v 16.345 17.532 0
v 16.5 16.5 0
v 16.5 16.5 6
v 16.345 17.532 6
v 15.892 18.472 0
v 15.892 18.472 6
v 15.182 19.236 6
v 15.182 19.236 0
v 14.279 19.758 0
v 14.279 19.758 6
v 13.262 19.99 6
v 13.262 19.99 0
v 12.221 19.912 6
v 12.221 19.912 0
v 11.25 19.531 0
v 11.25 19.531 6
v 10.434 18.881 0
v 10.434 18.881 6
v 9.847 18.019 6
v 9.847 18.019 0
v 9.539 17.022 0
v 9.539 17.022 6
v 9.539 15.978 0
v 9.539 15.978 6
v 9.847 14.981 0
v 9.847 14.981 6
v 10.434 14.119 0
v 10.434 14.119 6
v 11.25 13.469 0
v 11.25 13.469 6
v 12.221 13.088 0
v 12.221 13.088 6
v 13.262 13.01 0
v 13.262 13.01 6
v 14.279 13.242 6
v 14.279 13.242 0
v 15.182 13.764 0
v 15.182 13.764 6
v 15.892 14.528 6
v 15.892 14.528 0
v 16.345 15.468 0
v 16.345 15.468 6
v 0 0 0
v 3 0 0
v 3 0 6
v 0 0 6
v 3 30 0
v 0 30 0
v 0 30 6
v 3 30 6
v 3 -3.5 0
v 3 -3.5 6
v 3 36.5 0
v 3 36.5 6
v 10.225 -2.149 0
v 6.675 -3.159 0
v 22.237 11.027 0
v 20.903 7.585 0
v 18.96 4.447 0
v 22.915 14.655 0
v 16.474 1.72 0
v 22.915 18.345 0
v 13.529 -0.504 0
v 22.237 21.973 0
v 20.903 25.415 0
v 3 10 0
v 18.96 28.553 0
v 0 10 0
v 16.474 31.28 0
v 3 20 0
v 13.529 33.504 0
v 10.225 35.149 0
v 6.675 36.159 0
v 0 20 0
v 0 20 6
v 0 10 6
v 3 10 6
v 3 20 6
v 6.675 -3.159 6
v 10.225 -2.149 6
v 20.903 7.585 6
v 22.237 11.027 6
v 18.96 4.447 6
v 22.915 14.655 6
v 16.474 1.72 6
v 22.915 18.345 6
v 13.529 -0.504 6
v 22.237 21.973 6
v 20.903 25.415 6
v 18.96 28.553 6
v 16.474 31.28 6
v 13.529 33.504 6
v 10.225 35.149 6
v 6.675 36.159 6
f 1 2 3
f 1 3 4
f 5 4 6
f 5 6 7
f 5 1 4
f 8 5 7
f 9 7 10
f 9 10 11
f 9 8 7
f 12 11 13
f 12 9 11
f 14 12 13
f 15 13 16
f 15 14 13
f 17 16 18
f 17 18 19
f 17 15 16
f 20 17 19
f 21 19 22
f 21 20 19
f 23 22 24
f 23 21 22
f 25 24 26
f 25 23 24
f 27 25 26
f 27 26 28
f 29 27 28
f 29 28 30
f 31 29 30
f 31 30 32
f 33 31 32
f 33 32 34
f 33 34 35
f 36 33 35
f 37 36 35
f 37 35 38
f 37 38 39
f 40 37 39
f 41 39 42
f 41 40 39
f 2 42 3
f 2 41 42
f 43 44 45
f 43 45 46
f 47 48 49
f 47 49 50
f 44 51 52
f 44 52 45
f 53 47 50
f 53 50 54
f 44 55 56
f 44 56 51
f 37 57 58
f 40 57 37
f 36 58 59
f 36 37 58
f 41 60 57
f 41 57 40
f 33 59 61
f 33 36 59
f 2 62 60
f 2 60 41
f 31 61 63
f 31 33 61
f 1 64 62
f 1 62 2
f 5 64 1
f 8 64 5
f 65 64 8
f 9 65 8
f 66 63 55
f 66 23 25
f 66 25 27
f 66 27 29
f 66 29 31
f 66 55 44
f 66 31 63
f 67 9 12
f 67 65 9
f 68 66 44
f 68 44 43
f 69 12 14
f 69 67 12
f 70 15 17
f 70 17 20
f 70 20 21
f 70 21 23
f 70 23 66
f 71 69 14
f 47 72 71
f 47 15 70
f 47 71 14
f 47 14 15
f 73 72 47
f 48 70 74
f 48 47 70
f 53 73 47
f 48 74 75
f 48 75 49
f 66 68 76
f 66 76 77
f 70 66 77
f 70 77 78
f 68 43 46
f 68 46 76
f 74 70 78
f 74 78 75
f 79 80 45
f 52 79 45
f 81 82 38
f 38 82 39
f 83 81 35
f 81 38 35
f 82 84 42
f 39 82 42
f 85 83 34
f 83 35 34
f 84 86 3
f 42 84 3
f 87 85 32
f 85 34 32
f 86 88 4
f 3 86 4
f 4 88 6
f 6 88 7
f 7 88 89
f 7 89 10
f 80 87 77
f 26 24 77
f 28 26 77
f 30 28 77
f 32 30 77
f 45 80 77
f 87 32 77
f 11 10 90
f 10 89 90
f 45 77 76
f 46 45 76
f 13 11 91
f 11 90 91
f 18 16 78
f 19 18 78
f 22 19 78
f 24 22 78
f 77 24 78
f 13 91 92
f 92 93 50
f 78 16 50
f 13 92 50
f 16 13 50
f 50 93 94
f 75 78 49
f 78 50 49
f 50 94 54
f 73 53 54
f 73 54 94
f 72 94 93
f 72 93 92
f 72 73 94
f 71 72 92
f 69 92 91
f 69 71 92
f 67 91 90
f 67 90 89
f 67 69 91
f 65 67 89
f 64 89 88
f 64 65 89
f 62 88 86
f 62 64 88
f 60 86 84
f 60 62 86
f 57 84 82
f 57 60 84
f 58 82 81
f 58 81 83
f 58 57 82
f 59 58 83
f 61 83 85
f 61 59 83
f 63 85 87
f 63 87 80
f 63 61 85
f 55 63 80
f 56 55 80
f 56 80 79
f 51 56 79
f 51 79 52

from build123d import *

# Parameters (mm, degrees)
SKETCH1_R           = 3.5
BOSS_EXTRUDE1_DEPTH = 6


with BuildPart() as part:
    # Sketch1 → Boss-Extrude1 (new body)
    with BuildSketch(Plane.XY):
        with BuildLine():
            Line((0, 0), (0, 10))
            Line((0, 10), (3, 10))
            Line((3, 10), (3, 20))
            Line((3, 20), (0, 20))
            Line((0, 20), (0, 30))
            Line((0, 30), (3, 30))
            Line((3, 30), (3, 36.5))
            ThreePointArc((3, 36.5), (23, 16.5), (3, -3.5))
            Line((3, -3.5), (3, 0))
            Line((3, 0), (0, 0))
        make_face()
        with Locations((13, 16.5)):
            Circle(SKETCH1_R, mode=Mode.SUBTRACT)
    extrude(amount=BOSS_EXTRUDE1_DEPTH)


solid = part.part
